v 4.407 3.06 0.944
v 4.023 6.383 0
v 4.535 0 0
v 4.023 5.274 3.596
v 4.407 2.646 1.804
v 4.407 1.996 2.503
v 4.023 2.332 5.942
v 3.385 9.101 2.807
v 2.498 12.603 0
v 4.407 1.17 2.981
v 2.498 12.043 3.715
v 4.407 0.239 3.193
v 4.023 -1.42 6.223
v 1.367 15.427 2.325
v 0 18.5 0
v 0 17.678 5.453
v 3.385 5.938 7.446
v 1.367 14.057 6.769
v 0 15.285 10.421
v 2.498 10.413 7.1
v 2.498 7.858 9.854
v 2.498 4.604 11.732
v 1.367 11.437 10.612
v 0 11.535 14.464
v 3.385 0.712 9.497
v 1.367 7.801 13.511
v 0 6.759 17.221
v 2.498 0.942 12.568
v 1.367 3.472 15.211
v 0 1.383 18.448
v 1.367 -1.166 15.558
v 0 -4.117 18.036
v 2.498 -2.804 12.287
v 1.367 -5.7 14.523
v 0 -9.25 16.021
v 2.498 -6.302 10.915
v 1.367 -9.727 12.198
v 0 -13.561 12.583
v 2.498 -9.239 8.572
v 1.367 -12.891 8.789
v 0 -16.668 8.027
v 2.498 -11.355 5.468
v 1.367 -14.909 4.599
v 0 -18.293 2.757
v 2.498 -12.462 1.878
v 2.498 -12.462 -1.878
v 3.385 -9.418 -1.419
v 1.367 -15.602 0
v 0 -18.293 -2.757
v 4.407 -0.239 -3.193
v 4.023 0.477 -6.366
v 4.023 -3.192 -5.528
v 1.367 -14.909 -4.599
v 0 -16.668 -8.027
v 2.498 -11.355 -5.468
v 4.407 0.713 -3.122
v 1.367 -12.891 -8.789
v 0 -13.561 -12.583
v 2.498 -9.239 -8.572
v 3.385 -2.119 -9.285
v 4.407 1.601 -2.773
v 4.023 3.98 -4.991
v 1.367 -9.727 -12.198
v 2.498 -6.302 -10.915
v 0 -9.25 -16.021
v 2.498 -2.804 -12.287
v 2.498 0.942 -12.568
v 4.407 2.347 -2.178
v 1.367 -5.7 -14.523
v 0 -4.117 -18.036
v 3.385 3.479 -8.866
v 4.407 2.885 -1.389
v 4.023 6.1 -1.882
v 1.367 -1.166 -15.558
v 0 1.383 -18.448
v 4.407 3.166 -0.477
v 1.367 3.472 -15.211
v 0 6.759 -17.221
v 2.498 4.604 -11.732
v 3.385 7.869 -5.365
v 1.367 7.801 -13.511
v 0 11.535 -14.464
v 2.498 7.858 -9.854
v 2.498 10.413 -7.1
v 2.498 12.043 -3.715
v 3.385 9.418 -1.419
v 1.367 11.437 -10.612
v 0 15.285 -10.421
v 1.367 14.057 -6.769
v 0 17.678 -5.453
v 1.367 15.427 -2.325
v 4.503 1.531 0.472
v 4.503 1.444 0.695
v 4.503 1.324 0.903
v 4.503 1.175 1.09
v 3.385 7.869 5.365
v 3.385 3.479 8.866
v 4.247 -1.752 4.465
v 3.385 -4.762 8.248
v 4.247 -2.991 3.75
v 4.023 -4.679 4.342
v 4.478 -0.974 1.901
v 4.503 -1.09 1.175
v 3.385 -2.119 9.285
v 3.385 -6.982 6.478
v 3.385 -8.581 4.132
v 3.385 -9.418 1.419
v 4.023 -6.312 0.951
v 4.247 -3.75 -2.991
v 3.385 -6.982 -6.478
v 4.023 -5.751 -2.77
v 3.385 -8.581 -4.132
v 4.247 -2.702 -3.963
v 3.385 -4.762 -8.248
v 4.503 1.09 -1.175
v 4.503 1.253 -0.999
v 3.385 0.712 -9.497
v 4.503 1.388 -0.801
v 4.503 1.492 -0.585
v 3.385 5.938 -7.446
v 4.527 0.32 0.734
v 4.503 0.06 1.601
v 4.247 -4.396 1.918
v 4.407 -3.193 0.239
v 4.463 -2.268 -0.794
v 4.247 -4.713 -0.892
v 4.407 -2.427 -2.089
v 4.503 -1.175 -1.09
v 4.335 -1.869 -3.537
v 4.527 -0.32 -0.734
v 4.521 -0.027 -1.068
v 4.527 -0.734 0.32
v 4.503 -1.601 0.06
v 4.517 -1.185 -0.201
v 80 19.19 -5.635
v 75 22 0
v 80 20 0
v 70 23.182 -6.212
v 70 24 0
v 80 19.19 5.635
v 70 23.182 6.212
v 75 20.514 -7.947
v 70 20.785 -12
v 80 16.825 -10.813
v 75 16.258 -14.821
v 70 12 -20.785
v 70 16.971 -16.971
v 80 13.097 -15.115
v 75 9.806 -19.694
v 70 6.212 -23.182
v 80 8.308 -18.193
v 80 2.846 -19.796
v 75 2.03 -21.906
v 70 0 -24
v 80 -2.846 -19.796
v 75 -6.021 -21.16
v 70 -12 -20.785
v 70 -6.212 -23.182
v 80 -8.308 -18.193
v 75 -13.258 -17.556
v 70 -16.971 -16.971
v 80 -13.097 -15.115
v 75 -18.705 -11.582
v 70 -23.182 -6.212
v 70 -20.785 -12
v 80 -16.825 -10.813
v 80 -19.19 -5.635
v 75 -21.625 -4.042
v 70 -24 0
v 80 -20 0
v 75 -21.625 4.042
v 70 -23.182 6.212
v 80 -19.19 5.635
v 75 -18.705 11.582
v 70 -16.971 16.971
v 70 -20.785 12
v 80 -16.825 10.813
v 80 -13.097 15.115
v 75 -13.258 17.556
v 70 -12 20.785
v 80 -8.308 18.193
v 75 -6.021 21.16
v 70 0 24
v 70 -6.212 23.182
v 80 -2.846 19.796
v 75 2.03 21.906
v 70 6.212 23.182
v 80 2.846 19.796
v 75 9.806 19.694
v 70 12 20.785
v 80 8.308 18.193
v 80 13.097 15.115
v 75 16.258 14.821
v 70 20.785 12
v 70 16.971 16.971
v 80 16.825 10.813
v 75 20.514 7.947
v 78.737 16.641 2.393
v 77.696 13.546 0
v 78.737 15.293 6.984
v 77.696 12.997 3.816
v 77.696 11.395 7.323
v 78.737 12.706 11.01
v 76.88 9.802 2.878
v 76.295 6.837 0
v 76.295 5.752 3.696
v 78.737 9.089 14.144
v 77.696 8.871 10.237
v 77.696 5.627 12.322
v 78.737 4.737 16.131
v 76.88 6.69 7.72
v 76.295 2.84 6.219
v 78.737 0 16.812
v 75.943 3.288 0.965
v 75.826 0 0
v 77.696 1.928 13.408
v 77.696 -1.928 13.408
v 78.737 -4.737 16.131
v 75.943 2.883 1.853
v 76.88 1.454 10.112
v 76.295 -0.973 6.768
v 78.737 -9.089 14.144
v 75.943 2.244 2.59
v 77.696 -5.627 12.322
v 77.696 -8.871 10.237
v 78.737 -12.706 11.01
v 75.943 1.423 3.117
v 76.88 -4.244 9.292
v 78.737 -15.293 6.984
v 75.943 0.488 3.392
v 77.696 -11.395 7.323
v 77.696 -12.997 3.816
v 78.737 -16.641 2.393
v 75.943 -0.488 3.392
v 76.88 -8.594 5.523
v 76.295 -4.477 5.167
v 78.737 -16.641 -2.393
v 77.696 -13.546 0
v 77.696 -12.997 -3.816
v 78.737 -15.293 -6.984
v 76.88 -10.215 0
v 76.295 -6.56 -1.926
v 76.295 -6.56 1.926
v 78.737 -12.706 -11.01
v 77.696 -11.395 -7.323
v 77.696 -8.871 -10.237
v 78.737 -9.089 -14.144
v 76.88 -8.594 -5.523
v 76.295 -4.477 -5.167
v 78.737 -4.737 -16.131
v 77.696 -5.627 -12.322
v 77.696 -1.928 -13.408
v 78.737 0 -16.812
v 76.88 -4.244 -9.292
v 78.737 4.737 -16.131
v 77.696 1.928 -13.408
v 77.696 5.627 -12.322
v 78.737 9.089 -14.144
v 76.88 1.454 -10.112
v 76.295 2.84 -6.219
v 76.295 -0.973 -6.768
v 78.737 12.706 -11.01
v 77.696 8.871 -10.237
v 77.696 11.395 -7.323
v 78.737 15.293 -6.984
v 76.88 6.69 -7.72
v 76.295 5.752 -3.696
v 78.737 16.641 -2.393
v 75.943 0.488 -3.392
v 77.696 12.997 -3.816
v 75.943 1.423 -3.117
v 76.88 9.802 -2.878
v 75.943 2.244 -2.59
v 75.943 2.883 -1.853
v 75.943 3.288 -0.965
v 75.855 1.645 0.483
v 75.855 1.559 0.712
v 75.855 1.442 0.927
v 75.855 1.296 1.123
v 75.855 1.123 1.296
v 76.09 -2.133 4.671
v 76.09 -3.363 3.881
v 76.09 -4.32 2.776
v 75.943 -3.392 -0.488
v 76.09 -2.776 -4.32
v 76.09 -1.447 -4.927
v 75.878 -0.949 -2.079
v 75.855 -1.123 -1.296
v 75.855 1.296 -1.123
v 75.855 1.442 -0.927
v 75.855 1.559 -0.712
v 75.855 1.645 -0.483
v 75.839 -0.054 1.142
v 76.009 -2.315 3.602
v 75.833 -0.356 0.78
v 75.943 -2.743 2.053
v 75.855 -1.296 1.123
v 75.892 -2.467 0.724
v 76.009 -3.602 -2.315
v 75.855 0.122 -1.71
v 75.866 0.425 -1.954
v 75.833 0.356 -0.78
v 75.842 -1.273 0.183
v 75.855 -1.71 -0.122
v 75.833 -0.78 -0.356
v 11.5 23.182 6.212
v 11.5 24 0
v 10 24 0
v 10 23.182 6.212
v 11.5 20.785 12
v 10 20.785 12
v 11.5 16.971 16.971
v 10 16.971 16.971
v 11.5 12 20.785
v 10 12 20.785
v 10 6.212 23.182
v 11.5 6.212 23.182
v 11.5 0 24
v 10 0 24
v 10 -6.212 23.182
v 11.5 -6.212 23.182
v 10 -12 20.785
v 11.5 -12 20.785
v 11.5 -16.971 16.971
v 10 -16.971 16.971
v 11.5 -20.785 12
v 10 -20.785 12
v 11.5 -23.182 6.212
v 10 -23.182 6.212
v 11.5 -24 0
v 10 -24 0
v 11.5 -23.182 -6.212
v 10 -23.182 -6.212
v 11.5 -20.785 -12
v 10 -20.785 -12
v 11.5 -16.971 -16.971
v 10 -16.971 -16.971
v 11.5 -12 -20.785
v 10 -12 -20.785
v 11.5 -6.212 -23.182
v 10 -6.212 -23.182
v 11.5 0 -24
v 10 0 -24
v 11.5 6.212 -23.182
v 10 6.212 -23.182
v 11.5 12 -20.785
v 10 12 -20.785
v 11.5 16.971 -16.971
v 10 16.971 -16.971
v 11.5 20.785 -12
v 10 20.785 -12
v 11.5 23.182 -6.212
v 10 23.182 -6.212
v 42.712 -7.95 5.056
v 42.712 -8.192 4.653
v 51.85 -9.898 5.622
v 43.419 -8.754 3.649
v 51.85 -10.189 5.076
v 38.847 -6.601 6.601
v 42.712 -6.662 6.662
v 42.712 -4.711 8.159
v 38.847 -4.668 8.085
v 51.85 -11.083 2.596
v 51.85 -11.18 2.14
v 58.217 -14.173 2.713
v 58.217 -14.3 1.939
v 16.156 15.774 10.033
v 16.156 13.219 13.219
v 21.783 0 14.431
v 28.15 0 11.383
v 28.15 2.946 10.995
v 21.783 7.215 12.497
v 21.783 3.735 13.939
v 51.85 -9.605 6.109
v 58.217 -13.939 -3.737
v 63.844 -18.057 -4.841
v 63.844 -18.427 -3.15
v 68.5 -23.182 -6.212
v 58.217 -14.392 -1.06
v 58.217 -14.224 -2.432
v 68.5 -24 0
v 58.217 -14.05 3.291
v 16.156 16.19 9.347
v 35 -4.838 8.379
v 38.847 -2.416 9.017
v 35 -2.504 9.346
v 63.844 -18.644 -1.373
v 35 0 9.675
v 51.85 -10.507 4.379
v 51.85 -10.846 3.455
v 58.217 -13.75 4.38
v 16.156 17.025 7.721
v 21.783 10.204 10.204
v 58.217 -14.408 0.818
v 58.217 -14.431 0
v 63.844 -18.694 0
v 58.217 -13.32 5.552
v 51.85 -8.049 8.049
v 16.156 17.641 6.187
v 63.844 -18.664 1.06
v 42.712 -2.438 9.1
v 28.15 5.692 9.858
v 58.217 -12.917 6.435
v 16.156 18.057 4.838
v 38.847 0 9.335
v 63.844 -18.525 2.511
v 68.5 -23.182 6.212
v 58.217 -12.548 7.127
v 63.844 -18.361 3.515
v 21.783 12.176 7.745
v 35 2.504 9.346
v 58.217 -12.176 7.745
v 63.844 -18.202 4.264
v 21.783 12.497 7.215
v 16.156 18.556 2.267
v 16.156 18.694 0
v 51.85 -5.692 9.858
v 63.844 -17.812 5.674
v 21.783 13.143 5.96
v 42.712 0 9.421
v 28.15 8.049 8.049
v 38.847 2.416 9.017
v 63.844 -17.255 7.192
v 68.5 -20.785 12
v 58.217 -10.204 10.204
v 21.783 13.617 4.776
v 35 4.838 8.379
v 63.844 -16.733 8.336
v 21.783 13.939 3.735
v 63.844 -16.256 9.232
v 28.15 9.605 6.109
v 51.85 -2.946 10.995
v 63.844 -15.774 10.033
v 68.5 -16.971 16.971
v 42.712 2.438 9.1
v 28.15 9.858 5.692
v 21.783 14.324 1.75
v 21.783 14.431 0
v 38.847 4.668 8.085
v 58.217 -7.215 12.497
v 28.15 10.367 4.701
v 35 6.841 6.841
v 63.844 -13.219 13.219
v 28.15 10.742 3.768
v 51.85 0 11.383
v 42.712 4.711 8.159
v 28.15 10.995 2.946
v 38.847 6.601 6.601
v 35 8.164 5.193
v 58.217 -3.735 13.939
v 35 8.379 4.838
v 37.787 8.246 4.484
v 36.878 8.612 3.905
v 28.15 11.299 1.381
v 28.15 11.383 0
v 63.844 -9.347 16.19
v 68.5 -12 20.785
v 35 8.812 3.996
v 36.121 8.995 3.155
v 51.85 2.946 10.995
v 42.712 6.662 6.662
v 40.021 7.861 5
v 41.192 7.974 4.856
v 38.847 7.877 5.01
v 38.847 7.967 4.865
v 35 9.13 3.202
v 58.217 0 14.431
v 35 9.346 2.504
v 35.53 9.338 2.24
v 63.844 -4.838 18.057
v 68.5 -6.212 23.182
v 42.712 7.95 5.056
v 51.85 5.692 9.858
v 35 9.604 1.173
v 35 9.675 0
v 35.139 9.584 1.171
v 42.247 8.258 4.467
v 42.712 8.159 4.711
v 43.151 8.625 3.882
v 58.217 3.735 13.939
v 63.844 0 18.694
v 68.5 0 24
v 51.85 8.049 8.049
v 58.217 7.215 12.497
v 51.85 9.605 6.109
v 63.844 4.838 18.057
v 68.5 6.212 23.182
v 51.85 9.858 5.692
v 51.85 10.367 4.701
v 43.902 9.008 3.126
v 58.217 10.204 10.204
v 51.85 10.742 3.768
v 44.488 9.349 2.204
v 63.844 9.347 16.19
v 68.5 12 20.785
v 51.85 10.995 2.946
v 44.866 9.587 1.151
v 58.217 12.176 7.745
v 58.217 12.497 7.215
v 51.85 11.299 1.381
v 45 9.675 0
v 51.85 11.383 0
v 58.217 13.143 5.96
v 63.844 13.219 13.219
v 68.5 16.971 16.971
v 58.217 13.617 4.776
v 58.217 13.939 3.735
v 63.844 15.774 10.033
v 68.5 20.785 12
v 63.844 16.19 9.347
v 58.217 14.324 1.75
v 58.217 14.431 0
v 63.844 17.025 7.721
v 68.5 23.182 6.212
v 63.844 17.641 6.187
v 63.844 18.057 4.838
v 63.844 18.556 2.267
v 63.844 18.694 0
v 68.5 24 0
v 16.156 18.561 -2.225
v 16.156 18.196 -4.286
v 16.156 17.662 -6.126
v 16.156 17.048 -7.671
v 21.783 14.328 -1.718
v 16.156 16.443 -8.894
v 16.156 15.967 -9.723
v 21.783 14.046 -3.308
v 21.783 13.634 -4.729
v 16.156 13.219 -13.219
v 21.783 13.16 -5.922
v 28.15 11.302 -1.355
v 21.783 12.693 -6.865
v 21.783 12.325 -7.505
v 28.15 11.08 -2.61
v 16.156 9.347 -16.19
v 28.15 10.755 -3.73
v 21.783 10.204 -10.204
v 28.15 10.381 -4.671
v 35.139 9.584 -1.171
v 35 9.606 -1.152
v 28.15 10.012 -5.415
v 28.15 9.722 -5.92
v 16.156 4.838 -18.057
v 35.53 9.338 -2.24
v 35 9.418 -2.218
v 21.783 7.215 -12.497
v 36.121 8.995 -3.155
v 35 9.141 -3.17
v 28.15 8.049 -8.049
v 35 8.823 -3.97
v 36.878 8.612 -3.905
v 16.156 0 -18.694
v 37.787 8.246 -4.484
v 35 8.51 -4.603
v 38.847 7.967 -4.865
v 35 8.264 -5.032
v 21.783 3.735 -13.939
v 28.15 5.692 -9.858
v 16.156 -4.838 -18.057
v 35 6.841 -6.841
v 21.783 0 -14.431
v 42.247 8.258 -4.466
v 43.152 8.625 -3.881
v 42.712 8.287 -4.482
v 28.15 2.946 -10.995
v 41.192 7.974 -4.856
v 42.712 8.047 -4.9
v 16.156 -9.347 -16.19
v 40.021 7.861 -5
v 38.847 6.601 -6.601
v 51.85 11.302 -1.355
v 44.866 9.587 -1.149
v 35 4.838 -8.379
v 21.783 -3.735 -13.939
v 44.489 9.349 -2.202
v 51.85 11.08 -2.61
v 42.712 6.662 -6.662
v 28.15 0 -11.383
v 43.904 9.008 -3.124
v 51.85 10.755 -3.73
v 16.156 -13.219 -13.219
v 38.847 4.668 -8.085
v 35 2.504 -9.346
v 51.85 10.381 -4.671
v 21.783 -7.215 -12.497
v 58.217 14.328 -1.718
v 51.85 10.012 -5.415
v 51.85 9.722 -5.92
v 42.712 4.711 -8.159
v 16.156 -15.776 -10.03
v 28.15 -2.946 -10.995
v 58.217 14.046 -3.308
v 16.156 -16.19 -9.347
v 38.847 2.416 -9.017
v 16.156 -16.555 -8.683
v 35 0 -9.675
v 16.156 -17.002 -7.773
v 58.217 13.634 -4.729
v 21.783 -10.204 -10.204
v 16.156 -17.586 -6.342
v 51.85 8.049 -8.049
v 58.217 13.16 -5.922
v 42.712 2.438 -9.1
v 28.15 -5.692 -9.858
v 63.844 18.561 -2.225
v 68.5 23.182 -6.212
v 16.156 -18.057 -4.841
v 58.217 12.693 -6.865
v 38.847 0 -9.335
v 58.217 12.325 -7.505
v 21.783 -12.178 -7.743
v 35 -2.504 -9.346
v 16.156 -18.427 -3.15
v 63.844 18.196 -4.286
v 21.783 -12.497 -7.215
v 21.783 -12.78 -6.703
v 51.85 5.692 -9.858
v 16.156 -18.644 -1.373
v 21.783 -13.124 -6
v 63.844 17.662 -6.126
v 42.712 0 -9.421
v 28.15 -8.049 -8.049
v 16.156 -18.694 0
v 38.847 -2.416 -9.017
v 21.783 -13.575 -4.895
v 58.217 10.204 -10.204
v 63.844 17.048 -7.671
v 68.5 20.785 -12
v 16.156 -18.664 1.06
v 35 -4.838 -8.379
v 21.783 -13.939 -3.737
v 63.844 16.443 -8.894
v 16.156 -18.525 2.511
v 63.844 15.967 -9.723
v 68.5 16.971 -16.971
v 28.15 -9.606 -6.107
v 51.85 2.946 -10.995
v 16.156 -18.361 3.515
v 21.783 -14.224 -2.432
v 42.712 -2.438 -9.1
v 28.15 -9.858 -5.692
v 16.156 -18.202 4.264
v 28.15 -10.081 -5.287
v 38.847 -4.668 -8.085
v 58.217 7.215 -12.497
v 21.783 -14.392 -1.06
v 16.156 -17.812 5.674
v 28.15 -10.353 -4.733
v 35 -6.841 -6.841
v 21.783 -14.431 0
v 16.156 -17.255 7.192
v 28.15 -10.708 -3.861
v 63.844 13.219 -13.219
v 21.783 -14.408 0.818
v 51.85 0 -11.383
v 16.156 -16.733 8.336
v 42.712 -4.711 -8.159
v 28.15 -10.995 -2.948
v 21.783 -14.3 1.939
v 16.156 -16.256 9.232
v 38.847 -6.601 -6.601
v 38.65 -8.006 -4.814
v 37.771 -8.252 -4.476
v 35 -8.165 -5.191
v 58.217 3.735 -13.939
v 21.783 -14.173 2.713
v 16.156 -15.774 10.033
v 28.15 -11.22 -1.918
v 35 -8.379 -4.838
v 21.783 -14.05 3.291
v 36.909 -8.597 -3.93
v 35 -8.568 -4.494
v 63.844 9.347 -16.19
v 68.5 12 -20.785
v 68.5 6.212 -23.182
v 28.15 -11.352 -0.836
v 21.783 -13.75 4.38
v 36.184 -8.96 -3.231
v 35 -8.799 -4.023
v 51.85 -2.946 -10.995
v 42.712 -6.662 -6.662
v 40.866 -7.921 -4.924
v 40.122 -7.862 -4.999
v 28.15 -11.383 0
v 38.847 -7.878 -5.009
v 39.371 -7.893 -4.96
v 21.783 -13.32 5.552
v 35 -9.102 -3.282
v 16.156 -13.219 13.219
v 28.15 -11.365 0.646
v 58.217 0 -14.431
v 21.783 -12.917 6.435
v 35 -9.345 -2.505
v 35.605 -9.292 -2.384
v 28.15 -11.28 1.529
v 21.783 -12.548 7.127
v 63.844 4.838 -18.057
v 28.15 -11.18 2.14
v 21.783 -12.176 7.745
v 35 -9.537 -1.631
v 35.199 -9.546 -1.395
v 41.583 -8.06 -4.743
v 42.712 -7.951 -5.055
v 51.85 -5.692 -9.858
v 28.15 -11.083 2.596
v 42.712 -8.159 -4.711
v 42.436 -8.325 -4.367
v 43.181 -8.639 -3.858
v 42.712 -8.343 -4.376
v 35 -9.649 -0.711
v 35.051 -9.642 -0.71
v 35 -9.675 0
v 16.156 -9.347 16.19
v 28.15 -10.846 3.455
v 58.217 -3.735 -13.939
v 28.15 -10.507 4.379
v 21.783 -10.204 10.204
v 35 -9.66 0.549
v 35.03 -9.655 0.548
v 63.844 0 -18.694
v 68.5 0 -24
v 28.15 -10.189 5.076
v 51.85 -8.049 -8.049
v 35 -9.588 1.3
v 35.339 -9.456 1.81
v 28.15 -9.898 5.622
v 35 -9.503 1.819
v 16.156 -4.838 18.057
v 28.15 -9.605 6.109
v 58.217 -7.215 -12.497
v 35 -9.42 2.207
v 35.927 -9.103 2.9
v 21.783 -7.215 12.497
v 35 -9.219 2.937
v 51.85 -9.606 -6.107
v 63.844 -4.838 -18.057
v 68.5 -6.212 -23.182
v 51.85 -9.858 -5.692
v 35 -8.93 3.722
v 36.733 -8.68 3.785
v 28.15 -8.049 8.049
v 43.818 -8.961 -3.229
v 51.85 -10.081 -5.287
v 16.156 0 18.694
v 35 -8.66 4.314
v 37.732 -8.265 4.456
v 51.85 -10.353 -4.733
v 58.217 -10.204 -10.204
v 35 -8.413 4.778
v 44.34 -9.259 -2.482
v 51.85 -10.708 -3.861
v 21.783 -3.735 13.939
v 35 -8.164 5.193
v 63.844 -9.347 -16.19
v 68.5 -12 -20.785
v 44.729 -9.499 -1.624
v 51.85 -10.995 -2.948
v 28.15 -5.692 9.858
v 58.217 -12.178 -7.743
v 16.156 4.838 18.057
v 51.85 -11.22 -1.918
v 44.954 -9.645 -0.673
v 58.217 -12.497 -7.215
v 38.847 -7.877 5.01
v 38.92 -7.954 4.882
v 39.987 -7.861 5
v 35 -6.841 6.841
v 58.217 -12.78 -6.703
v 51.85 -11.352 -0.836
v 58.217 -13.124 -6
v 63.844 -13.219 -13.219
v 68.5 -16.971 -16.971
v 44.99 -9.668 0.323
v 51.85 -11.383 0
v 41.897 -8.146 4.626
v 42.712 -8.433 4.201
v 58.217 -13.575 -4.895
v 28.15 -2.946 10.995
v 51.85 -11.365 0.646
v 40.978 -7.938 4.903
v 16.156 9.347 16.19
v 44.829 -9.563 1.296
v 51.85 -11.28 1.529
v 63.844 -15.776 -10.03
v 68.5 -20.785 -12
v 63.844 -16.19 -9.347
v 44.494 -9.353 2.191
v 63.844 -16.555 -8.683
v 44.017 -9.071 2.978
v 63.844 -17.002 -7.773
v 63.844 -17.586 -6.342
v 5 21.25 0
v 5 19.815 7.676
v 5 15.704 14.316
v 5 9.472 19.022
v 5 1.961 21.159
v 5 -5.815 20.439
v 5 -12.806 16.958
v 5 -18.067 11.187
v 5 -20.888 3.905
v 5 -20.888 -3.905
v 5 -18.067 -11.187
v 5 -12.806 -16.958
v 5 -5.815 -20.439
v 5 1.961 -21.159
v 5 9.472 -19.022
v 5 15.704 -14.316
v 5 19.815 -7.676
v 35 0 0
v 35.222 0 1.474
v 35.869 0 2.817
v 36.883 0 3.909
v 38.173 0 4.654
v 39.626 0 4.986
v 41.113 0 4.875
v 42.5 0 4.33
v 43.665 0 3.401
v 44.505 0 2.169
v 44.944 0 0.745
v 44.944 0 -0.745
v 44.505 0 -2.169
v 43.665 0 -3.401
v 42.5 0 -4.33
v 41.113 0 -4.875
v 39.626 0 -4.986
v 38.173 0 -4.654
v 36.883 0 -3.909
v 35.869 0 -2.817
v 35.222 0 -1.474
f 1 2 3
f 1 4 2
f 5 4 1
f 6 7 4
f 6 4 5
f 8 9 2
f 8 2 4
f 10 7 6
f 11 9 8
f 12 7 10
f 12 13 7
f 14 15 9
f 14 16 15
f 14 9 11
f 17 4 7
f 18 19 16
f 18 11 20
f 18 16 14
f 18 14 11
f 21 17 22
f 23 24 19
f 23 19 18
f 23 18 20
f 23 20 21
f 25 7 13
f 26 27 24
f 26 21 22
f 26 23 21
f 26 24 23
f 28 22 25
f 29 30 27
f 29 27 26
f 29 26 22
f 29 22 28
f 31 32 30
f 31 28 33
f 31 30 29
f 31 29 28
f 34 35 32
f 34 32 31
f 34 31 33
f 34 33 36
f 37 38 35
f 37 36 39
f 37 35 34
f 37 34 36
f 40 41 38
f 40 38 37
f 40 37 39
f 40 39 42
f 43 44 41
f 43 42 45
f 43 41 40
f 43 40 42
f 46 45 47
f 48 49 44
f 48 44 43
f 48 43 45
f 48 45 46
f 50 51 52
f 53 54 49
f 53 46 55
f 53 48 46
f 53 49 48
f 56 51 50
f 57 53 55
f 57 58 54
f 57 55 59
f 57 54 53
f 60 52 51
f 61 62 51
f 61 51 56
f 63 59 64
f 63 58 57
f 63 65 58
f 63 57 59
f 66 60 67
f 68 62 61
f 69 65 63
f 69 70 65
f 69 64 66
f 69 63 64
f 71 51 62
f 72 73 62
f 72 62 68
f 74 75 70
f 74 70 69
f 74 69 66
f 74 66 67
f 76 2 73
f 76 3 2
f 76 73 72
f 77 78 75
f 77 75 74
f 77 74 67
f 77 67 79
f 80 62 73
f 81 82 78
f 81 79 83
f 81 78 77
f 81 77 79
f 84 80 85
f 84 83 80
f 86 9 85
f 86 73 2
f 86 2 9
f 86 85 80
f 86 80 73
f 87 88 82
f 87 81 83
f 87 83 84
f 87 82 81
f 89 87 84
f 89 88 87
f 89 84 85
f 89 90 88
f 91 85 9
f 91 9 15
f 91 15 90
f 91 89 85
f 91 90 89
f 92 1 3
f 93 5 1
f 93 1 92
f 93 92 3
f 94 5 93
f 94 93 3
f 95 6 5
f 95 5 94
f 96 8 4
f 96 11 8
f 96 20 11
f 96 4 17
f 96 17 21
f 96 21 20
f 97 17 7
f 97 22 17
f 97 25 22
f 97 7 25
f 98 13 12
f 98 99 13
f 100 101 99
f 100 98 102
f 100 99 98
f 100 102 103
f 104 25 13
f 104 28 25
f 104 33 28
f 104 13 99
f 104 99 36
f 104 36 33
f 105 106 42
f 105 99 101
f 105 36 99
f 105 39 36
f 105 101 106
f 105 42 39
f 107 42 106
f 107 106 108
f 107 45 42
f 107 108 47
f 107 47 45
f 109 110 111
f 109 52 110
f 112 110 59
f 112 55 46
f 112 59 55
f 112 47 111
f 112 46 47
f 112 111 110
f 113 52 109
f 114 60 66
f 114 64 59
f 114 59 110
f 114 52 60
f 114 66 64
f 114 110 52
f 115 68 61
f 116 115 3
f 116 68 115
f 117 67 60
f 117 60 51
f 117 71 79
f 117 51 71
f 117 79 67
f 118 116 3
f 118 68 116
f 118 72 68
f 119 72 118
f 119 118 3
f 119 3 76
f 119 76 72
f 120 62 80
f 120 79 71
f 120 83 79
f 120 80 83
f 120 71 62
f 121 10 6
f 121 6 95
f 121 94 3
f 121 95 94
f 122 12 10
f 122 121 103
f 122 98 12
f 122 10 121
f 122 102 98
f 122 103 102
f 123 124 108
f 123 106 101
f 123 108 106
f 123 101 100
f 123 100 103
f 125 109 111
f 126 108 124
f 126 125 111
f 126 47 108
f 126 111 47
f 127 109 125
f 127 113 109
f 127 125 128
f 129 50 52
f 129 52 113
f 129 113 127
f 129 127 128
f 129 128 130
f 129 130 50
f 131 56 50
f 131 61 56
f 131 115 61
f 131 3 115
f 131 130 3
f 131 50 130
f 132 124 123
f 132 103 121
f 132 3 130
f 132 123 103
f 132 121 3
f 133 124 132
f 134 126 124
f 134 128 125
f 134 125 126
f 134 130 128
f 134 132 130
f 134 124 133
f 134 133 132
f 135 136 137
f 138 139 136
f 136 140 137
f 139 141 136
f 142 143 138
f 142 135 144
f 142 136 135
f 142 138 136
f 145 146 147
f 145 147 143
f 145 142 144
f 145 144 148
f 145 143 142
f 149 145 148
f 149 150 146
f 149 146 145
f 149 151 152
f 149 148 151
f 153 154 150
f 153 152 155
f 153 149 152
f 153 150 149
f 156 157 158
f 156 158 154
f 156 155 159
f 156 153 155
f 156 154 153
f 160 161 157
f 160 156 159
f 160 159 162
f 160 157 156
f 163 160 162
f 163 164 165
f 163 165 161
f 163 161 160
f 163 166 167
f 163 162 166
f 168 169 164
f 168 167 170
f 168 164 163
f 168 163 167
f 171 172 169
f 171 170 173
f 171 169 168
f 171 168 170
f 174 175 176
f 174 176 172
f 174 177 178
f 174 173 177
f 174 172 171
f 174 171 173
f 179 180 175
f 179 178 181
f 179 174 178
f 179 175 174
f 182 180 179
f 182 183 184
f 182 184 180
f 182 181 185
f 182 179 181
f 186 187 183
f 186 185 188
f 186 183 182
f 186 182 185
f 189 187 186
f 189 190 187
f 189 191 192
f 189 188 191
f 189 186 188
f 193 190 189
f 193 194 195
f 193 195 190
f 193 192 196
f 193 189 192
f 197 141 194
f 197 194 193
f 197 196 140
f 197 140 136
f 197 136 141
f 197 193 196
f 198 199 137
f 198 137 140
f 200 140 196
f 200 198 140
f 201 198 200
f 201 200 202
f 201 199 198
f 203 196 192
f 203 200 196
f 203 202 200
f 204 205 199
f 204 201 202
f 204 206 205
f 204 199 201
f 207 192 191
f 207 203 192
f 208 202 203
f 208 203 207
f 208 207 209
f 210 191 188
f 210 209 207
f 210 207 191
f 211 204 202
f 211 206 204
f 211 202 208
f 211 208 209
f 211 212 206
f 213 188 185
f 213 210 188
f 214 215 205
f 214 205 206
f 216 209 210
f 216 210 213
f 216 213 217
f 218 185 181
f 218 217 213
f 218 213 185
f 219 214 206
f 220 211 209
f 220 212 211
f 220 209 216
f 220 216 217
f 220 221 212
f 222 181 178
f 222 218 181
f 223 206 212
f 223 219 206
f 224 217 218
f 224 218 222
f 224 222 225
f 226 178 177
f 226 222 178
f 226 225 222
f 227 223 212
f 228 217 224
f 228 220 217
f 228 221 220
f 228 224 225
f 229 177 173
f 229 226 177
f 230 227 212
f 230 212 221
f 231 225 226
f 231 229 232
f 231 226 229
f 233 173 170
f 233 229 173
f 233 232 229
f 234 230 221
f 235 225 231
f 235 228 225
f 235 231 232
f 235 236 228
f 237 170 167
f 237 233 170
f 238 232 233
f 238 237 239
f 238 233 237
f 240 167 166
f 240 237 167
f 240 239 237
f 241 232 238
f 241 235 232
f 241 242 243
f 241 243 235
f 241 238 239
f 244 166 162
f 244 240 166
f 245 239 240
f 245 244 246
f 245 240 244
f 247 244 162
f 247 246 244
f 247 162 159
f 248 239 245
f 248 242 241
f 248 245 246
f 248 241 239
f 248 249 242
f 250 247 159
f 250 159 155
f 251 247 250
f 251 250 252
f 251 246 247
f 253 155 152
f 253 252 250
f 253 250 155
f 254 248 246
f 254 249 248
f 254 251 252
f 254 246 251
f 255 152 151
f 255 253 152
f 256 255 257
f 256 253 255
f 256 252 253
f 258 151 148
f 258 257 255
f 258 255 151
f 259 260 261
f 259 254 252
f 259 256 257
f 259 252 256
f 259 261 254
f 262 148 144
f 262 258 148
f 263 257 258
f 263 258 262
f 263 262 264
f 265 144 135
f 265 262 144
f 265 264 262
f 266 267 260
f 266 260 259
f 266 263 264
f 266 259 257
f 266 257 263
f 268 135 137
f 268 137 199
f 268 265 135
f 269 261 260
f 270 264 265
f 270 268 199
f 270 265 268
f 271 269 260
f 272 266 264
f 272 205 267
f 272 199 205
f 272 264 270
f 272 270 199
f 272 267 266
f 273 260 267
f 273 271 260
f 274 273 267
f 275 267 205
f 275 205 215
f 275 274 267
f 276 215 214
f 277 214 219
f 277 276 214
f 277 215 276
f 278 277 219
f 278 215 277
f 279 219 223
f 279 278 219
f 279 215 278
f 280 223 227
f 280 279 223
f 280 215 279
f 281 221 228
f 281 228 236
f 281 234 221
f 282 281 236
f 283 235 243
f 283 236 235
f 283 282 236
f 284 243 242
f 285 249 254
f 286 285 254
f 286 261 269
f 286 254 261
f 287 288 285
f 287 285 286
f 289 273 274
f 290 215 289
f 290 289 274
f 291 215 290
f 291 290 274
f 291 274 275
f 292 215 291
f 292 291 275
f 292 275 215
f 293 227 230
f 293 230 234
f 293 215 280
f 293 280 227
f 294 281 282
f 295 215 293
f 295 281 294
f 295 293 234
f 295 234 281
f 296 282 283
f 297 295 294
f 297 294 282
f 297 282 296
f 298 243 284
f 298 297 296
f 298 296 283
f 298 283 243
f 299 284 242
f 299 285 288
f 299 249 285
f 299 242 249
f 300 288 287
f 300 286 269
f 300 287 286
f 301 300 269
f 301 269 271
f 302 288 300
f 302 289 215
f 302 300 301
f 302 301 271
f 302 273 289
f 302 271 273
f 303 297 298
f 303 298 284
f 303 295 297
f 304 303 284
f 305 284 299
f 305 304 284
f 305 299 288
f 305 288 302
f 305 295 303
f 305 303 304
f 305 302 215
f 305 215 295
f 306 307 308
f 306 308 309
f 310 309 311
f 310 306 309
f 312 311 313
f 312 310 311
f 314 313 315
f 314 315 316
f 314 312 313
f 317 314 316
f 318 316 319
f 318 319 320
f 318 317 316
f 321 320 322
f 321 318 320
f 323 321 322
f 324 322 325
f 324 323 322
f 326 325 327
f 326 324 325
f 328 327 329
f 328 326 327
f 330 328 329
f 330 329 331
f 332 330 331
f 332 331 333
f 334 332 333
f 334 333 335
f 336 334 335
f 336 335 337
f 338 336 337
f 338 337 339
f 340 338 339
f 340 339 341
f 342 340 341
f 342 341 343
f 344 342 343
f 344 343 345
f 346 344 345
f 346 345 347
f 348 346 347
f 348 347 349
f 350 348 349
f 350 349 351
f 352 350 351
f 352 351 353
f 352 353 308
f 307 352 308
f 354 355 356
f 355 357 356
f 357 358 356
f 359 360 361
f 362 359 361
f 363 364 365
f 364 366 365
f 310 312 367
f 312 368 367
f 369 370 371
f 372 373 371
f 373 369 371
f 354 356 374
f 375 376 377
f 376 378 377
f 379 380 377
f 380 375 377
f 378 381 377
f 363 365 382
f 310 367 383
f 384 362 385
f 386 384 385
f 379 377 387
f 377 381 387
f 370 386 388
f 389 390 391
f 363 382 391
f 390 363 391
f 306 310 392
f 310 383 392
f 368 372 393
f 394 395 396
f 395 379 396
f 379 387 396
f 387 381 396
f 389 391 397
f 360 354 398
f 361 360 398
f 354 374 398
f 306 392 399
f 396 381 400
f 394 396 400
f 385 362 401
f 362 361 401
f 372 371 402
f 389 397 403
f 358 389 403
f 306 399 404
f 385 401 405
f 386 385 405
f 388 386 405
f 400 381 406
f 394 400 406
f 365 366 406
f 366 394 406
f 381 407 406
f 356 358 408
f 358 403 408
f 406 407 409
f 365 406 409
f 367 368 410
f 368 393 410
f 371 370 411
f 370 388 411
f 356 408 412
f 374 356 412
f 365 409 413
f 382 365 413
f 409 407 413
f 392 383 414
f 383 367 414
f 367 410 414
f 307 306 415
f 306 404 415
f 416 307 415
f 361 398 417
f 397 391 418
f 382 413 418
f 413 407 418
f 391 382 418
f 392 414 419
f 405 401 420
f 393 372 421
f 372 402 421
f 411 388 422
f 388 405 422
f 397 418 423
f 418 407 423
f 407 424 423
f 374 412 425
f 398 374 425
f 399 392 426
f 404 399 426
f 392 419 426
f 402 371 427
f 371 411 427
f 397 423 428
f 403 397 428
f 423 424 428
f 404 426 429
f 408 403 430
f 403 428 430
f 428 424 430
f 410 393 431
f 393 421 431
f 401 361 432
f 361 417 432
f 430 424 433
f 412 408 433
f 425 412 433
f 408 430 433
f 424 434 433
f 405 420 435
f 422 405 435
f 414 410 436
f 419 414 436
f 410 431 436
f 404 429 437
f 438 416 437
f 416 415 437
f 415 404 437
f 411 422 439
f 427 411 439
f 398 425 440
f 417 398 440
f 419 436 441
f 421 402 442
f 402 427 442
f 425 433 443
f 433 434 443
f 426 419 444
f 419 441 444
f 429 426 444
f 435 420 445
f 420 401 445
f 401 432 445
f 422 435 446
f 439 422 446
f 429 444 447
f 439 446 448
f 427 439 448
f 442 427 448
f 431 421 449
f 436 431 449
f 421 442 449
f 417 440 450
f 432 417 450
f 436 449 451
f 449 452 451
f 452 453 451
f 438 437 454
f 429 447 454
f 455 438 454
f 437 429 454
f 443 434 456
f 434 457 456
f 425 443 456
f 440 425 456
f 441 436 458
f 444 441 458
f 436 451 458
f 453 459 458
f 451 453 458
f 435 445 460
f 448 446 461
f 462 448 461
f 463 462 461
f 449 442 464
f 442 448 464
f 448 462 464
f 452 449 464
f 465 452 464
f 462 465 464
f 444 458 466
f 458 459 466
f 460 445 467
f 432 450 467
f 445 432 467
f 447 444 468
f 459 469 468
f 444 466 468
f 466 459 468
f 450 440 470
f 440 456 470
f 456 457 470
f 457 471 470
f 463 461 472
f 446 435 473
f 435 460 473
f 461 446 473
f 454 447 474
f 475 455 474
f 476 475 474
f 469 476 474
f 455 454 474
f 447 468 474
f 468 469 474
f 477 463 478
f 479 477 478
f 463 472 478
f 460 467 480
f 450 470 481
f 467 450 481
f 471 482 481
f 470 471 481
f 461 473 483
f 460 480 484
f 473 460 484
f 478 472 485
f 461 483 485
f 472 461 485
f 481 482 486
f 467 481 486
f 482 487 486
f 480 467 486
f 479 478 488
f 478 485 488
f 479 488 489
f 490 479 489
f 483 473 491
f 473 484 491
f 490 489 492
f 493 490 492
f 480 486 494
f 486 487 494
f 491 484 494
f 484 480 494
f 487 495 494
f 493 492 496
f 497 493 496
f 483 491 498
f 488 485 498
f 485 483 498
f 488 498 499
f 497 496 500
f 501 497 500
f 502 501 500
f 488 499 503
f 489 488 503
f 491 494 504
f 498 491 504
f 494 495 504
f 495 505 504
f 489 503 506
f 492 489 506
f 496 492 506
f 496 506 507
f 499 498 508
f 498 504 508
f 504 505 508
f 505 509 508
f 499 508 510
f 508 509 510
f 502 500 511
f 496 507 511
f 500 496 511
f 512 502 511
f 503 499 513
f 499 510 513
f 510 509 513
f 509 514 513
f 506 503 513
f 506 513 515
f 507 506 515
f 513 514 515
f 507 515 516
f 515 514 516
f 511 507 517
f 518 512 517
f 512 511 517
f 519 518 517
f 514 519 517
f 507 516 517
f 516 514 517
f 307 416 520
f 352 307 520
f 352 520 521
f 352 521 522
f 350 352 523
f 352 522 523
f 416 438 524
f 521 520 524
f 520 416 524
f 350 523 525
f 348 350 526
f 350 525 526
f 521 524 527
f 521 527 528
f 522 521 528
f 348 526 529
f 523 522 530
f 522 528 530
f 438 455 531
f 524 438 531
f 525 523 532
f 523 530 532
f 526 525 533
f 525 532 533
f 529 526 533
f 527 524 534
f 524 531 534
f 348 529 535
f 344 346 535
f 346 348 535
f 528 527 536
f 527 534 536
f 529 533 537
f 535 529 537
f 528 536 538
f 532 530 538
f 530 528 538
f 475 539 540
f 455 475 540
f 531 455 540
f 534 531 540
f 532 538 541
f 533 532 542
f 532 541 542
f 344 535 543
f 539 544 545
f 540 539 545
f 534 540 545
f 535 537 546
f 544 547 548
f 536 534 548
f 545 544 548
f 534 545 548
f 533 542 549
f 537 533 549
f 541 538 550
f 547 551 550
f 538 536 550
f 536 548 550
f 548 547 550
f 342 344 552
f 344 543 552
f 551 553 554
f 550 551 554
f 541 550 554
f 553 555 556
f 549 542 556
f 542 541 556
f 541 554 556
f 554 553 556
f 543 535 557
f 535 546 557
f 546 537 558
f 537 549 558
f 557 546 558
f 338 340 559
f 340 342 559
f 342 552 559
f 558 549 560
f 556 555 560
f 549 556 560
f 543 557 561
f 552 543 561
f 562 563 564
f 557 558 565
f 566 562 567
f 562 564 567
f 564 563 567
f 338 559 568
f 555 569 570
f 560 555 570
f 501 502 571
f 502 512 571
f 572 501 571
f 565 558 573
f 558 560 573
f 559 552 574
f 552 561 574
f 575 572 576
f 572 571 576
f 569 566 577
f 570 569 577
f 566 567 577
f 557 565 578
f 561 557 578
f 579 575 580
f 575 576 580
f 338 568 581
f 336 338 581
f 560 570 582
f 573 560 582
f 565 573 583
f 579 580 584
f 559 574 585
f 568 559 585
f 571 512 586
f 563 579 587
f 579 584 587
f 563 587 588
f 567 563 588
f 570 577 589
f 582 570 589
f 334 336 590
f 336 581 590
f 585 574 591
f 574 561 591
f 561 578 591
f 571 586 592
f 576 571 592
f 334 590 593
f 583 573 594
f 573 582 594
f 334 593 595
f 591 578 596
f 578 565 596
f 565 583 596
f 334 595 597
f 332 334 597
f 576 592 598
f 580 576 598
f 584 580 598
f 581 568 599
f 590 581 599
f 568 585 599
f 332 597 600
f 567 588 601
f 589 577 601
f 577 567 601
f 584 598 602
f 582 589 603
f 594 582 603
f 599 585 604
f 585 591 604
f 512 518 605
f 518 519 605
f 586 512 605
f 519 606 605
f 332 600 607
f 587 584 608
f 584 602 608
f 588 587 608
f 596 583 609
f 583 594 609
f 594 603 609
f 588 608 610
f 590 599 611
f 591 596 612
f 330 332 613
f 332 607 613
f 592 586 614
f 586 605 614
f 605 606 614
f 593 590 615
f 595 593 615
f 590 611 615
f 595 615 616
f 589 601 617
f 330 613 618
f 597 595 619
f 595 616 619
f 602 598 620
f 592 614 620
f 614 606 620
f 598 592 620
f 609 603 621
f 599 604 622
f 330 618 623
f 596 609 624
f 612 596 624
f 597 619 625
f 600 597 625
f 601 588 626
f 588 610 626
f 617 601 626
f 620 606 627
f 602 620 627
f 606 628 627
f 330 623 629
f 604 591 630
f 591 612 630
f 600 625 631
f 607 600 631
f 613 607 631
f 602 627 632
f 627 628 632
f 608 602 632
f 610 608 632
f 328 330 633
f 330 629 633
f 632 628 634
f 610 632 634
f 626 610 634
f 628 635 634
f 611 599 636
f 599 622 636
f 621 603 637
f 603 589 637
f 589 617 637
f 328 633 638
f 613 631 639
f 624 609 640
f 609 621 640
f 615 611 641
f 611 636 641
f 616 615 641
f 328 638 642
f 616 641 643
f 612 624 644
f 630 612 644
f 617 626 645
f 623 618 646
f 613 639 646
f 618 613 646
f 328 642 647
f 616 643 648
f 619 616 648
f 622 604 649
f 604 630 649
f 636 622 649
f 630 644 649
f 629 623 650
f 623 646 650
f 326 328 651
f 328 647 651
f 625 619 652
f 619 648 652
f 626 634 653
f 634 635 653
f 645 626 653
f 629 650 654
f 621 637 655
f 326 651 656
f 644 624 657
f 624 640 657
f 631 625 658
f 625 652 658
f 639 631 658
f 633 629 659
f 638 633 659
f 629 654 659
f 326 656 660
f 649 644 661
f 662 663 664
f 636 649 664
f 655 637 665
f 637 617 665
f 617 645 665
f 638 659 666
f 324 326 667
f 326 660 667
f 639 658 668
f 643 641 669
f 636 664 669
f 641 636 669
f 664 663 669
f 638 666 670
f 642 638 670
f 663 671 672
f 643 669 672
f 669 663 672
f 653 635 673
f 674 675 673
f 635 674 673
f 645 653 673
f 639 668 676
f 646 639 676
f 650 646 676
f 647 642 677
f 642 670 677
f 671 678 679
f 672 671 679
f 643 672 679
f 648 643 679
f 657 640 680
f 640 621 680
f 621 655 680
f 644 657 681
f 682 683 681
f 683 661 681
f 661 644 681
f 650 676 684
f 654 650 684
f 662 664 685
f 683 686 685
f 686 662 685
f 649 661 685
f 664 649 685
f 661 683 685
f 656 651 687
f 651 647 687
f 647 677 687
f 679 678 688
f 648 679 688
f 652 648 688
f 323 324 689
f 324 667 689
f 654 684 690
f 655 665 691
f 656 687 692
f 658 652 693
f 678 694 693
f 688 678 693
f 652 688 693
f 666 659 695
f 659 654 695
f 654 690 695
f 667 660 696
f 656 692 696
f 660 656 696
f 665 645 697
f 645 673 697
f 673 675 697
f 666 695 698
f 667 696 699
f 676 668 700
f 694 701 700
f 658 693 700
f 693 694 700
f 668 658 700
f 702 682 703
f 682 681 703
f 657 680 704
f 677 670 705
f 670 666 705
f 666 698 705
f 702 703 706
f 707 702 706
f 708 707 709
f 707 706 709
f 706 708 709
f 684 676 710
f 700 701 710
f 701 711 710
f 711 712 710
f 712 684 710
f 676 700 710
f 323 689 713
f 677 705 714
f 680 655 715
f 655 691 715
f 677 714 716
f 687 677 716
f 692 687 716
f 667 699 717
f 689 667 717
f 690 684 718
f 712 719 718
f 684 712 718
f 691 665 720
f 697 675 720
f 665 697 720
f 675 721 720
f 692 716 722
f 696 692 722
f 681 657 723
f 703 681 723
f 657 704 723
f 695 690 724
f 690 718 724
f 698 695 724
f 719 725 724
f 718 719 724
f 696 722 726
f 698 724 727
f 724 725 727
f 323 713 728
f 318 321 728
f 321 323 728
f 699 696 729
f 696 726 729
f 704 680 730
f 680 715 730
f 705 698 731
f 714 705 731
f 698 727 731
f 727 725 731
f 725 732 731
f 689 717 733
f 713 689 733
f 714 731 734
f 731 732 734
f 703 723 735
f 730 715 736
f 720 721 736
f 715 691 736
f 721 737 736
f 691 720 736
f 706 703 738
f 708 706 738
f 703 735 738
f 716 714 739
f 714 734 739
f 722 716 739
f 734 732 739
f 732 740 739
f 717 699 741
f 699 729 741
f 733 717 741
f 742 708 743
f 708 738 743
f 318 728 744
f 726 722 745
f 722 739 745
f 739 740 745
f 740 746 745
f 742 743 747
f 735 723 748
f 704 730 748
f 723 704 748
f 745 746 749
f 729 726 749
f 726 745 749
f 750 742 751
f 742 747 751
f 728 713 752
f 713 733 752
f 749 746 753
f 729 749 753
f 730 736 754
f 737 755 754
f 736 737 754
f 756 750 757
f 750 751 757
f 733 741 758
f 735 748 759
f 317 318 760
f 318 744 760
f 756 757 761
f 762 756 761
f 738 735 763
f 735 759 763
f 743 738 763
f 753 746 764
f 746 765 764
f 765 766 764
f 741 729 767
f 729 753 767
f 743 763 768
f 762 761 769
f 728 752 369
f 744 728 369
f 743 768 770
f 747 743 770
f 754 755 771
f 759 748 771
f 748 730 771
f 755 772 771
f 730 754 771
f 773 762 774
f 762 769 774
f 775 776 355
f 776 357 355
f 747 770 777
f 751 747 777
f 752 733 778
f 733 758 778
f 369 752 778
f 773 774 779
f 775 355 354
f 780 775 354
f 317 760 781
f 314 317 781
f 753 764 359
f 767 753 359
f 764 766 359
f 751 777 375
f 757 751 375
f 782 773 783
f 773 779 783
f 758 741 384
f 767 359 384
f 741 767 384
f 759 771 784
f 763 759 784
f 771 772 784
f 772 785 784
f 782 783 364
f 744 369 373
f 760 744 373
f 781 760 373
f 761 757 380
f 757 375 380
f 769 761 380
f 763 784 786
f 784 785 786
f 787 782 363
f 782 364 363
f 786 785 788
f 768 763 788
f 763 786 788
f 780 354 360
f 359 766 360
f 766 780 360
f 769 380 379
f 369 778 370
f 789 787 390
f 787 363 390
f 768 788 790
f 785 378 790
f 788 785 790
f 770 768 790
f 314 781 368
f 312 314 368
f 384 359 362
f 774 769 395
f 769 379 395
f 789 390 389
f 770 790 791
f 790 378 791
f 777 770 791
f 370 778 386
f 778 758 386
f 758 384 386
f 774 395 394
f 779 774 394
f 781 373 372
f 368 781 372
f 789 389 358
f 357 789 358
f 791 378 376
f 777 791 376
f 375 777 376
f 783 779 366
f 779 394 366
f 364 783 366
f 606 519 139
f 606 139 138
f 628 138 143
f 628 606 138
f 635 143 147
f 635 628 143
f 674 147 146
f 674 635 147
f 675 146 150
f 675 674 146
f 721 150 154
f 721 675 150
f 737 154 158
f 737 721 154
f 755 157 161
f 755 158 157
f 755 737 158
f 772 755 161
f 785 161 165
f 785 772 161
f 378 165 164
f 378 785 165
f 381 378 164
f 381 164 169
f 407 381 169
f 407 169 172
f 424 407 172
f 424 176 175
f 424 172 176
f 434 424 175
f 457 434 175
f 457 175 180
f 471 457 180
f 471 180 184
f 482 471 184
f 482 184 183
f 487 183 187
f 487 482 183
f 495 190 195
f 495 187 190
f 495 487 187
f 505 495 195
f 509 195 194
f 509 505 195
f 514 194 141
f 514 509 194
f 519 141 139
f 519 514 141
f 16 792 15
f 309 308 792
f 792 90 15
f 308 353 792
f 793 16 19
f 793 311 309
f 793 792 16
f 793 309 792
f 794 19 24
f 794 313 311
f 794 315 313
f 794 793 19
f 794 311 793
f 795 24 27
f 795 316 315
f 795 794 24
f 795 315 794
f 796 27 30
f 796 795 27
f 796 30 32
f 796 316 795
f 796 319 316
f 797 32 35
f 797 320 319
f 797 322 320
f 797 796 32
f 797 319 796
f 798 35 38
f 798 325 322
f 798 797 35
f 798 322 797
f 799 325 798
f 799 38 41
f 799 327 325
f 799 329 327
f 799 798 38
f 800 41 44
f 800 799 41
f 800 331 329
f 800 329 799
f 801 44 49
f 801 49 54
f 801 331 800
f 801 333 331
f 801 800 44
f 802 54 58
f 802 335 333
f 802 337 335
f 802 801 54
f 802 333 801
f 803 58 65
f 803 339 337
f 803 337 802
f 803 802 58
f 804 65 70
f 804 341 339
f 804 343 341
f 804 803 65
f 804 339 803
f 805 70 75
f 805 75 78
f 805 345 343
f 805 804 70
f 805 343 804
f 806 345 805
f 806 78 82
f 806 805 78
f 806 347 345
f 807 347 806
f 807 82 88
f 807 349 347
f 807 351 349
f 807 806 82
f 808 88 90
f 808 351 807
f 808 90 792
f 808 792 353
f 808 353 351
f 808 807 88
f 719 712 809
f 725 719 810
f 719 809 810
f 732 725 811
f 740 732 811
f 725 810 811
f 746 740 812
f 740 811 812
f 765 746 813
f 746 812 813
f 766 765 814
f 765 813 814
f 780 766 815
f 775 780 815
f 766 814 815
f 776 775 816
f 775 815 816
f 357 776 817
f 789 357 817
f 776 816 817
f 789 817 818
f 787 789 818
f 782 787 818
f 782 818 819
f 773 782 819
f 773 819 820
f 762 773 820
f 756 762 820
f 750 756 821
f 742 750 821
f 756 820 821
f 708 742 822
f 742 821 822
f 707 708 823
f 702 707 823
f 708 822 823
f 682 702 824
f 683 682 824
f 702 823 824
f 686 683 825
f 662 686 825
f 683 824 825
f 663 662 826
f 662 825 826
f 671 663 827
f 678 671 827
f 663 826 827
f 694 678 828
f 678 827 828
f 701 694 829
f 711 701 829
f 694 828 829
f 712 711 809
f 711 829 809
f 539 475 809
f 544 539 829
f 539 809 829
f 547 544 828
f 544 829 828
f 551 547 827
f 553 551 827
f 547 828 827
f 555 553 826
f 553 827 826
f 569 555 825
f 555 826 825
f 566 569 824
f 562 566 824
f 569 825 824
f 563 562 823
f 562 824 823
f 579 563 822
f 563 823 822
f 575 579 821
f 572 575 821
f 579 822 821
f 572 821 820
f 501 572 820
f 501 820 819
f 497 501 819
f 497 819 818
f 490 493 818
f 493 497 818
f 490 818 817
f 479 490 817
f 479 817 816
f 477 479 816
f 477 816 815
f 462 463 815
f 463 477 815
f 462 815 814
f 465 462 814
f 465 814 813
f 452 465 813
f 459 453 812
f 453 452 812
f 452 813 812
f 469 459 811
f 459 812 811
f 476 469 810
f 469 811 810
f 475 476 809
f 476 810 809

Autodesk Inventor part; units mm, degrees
ref_plane "YZ Plane" through (0, 0, 0) normal (1, 0, 0) x (0, 1, 0)
ref_plane "XZ Plane" through (0, 0, 0) normal (0, 1, 0) x (-1, 0, 0)
ref_plane "XY Plane" through (0, 0, 0) normal (0, 0, 1) x (1, 0, 0)
sketch "草圖1" plane through (0, 0, 0) normal (0, 0, 1) x (1, 0, 0)
  line L0 (0, 18.5) -> (10, 24)
  line L1 (10, 24) -> (11.5, 24)
  line L2 (80, 20) -> (70, 24)
  line L3 (70, 24) -> (68.5, 24)
  line L4 (0, 0) -> (80, 0)
  arc A0 (11.5, 24) -> (68.5, 24) centre (40, 44.3162) ccw
  arc A1 (4.5352, 0) -> (0, 18.5) centre (-35.4648, 0) ccw
  arc A2 (80, 20) -> (75.8258, 0) centre (125.8258, 0) ccw
  dimension "d0" = 18.5
  dimension "d2" = 1.5
  dimension "d3" = 1.5
  dimension "d4" = 24
  dimension "d6" = 20
  dimension "d8" = 24
  dimension "d9" = 35
  dimension "d21" = 40
  dimension "d23" = 50
  dimension "d33" = 158.199
  dimension "d34" = 129.388
  dimension "d35" = 48.2808
  dimension "d36" = 16.21
  dimension "d37" = 1.5503
  dimension "d38" = 24
  dimension "d39" = 46.5964
revolve "迴轉1" add sketch "草圖1" angle 360 about axis through (0, 0, 0) along (1, 0, 0)
sketch "草圖2" plane through (0, 0, 0) normal (0, 1, 0) x (-1, 0, 0)
  circle A0 centre (-40, 0) radius 5
  point P0 (0, 0)
  dimension "d11" = 10
  dimension "d12" = 0
  dimension "d13" = 40
extrude "擠出1" cut sketch "草圖2" along normal mid plane 60
properties part number "A"
